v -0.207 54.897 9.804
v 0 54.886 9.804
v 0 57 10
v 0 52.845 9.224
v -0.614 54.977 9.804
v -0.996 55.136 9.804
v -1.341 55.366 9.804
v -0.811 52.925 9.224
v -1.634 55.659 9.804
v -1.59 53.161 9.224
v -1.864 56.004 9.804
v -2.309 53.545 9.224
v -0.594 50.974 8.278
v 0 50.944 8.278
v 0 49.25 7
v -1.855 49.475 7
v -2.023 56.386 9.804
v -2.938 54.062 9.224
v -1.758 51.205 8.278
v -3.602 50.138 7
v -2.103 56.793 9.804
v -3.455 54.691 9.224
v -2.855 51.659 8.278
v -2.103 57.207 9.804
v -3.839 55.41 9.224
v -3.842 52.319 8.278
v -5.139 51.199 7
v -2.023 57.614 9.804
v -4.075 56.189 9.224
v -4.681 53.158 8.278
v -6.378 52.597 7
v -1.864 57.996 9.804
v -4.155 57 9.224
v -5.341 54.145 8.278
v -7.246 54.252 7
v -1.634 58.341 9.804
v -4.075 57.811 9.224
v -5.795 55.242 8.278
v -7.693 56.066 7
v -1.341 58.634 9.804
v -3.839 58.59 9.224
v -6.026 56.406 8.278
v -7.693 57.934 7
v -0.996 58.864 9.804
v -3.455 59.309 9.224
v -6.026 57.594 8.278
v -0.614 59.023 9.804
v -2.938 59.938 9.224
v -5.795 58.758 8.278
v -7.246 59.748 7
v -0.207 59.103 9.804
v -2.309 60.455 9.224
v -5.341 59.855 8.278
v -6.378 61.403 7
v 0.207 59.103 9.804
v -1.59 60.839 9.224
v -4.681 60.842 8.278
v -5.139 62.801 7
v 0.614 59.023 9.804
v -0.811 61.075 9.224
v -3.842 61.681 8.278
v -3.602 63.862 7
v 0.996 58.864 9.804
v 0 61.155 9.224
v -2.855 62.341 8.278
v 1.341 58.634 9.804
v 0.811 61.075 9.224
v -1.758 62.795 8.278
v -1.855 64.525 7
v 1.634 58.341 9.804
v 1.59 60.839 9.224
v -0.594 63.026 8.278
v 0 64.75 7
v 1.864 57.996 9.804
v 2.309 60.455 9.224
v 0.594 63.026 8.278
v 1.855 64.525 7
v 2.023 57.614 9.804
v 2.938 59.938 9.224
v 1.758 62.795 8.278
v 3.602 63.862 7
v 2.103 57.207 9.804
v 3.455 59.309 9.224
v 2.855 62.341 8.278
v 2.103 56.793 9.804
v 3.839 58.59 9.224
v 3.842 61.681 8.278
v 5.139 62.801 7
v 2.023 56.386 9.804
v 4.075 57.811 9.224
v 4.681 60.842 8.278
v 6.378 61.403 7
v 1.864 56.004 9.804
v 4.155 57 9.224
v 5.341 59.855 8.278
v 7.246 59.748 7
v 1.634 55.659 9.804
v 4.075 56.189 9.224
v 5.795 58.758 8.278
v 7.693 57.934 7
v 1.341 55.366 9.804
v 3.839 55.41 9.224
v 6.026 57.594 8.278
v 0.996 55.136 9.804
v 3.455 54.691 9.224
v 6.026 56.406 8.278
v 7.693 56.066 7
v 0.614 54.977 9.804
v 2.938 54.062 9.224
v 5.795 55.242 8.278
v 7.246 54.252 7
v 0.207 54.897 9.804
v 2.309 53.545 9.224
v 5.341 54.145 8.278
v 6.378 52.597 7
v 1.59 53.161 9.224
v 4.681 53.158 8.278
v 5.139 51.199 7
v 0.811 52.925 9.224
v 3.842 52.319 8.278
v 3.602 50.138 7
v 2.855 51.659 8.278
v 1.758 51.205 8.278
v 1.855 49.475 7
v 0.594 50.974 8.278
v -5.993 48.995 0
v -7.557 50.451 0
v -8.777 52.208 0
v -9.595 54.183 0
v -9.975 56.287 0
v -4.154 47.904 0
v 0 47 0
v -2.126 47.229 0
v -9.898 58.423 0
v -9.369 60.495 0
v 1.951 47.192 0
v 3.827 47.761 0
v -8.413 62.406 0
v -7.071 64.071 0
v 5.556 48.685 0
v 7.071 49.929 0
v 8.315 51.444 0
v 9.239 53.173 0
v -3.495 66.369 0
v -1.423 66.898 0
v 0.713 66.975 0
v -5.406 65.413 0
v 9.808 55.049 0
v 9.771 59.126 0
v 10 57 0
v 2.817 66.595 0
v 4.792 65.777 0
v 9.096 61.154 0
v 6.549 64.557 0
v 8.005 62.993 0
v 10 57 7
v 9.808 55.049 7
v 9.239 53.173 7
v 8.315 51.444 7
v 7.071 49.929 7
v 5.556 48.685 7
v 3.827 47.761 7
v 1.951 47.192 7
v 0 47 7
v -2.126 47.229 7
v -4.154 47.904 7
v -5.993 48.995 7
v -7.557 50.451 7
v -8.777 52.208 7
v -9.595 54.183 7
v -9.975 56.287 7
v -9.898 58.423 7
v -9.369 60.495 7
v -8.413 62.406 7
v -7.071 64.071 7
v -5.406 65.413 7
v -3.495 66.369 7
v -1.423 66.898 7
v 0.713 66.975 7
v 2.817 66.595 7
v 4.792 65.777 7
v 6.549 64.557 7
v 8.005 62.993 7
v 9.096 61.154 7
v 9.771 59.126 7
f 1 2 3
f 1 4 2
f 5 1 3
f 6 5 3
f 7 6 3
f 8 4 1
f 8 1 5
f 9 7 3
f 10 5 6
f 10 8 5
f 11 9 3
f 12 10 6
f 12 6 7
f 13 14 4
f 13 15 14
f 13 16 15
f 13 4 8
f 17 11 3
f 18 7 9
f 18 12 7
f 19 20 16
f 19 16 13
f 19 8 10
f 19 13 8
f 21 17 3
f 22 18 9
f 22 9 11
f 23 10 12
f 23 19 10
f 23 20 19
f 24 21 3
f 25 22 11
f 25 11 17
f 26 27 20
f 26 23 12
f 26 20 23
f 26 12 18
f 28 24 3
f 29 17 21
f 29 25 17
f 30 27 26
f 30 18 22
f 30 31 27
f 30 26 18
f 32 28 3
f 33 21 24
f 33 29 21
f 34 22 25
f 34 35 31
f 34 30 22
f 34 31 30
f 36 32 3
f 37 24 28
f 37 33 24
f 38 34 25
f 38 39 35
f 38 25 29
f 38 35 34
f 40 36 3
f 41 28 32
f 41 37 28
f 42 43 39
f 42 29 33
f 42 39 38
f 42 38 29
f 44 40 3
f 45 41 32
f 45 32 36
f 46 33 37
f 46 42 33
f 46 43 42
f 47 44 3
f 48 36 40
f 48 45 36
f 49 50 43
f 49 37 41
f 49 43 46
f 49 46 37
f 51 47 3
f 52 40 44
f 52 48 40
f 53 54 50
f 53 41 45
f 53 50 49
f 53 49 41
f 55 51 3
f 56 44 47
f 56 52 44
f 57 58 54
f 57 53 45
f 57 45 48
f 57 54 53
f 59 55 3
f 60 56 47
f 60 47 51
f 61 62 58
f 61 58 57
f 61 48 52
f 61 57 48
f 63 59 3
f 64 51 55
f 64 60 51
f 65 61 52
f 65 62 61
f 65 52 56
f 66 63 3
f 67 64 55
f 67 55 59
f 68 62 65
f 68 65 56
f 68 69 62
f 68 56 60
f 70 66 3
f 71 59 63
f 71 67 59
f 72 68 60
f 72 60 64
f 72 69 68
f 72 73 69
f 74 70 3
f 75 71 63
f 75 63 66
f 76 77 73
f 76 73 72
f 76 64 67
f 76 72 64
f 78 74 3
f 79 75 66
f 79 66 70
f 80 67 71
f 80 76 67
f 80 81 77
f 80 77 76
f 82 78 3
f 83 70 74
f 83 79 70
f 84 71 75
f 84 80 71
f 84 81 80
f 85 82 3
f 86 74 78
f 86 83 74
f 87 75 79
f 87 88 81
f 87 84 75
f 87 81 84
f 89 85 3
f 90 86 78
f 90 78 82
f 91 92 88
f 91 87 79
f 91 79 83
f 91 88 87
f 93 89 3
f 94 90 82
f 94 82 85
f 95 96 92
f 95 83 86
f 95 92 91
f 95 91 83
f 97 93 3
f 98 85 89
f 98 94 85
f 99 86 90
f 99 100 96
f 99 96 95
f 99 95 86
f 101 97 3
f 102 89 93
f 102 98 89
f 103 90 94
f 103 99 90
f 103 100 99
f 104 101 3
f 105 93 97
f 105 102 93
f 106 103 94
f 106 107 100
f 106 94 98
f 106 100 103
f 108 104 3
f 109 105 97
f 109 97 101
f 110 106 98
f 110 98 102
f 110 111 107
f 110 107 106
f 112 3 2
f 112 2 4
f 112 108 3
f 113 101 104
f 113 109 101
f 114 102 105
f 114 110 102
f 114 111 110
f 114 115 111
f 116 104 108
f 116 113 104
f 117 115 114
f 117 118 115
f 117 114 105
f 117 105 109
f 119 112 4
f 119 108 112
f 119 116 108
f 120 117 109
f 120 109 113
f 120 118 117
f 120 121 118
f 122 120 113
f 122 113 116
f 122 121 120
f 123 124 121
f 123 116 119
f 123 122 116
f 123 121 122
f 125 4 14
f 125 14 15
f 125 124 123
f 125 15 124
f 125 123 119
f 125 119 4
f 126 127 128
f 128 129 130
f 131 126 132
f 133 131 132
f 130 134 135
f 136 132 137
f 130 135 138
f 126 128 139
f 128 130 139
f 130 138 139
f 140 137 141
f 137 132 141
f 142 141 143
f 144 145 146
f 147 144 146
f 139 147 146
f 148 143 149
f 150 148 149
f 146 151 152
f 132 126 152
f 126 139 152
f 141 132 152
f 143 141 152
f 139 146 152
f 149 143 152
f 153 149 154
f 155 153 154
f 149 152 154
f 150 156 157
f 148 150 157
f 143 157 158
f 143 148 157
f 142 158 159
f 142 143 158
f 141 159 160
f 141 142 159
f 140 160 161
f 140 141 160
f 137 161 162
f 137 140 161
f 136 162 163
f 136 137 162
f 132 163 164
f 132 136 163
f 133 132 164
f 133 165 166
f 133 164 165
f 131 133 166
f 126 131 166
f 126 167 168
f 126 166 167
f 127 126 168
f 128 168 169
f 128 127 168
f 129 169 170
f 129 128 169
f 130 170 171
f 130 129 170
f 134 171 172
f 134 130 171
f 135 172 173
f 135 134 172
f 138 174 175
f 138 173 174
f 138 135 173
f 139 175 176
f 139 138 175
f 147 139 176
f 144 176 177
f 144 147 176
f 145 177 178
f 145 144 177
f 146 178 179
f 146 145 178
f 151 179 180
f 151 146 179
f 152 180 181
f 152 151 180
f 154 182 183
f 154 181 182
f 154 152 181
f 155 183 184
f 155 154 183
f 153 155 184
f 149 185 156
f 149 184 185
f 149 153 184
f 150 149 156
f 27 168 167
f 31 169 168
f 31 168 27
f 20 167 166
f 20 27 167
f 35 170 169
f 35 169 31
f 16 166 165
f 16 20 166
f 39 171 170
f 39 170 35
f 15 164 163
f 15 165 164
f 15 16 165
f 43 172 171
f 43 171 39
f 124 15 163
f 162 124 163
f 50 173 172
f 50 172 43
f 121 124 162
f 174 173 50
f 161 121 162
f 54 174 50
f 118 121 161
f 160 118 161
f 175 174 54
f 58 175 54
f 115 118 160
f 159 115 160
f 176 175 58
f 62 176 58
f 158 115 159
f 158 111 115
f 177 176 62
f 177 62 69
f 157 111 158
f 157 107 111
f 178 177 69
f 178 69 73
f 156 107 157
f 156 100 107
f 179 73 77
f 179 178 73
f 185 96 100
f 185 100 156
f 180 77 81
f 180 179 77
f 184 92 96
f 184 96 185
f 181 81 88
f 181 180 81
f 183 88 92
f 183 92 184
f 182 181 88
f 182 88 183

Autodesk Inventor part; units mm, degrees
ref_plane "YZ Plane" through (0, 0, 0) normal (1, 0, 0) x (0, 1, 0)
ref_plane "XZ Plane" through (0, 0, 0) normal (0, 1, 0) x (-1, 0, 0)
ref_plane "XY Plane" through (0, 0, 0) normal (0, 0, 1) x (1, 0, 0)
sketch "Sketch1" plane through (0, 0, 0) normal (0, 0, 1) x (1, 0, 0)
  line L0 (14, 0) -> (-14, 0)
  line L1 (0, 0) -> (0, 47)
  line L2 (0, 47) -> (0, 57)
  circle A0 centre (0, 57) radius 10
  circle A1 centre (0, 57) radius 8.5
  dimension "d0" = 47
  dimension "d1" = 10
  dimension "d2" = 1.5
extrude "Extrusion1" add sketch "Sketch1" along normal blind 7
sketch "Sketch2" plane through (0, 57, 0) normal (0, 0, -1) x (-1, 0, 0)
  circle A0 centre (0, 0) radius 7.75
  point P0 (0, -57)
  dimension "d5" = 15.5
extrude "Extrusion2" add sketch "Sketch2" against normal up to surface (7 mm away)
sketch "Sketch3" plane through (0, 57, 0) normal (0, 0, -1) x (-1, 0, 0)
  circle A0 centre (0, 0) radius 7.75 projected
  circle A1 centre (0, 0) radius 10
  point P0 (0, -57)
extrude "Extrusion3" add sketch "Sketch3" against normal blind 4 contours A0 | A1
sketch "Sketch4" plane through (0, 0, 0) normal (1, 0, 0) x (0, 1, 0)
  line L0 (57, 0) -> (57, 7)
  line L1 (48.5, 7) -> (65.5, 7) projected
  line L2 (57, 7) -> (57, 10)
  line L3 (64.75, 4) -> (64.75, 7) projected
  line L4 (49.25, 4) -> (49.25, 7) projected
  arc A0 (64.75, 7) -> (49.25, 7) centre (57, -1.5104) ccw
  point P0 (0, 0)
  dimension "d10" = 3
revolve "Revolution1" add sketch "Sketch4" angle 360 about axis through (0, 57, 7) along (0, 0, 1) picked at (52.6027, 7.5441) contours A0 L2 L1
sketch "Sketch5" plane through (0, 57, 7) normal (0, 0, 1) x (1, 0, 0)
  circle A0 centre (0, 0) radius 7.75
  circle A1 centre (0, 0) radius 8.5
  point P0 (0, -57)
extrude "Extrusion4" add sketch "Sketch5" against normal up to surface (7 mm away)
properties part number "Button1"
